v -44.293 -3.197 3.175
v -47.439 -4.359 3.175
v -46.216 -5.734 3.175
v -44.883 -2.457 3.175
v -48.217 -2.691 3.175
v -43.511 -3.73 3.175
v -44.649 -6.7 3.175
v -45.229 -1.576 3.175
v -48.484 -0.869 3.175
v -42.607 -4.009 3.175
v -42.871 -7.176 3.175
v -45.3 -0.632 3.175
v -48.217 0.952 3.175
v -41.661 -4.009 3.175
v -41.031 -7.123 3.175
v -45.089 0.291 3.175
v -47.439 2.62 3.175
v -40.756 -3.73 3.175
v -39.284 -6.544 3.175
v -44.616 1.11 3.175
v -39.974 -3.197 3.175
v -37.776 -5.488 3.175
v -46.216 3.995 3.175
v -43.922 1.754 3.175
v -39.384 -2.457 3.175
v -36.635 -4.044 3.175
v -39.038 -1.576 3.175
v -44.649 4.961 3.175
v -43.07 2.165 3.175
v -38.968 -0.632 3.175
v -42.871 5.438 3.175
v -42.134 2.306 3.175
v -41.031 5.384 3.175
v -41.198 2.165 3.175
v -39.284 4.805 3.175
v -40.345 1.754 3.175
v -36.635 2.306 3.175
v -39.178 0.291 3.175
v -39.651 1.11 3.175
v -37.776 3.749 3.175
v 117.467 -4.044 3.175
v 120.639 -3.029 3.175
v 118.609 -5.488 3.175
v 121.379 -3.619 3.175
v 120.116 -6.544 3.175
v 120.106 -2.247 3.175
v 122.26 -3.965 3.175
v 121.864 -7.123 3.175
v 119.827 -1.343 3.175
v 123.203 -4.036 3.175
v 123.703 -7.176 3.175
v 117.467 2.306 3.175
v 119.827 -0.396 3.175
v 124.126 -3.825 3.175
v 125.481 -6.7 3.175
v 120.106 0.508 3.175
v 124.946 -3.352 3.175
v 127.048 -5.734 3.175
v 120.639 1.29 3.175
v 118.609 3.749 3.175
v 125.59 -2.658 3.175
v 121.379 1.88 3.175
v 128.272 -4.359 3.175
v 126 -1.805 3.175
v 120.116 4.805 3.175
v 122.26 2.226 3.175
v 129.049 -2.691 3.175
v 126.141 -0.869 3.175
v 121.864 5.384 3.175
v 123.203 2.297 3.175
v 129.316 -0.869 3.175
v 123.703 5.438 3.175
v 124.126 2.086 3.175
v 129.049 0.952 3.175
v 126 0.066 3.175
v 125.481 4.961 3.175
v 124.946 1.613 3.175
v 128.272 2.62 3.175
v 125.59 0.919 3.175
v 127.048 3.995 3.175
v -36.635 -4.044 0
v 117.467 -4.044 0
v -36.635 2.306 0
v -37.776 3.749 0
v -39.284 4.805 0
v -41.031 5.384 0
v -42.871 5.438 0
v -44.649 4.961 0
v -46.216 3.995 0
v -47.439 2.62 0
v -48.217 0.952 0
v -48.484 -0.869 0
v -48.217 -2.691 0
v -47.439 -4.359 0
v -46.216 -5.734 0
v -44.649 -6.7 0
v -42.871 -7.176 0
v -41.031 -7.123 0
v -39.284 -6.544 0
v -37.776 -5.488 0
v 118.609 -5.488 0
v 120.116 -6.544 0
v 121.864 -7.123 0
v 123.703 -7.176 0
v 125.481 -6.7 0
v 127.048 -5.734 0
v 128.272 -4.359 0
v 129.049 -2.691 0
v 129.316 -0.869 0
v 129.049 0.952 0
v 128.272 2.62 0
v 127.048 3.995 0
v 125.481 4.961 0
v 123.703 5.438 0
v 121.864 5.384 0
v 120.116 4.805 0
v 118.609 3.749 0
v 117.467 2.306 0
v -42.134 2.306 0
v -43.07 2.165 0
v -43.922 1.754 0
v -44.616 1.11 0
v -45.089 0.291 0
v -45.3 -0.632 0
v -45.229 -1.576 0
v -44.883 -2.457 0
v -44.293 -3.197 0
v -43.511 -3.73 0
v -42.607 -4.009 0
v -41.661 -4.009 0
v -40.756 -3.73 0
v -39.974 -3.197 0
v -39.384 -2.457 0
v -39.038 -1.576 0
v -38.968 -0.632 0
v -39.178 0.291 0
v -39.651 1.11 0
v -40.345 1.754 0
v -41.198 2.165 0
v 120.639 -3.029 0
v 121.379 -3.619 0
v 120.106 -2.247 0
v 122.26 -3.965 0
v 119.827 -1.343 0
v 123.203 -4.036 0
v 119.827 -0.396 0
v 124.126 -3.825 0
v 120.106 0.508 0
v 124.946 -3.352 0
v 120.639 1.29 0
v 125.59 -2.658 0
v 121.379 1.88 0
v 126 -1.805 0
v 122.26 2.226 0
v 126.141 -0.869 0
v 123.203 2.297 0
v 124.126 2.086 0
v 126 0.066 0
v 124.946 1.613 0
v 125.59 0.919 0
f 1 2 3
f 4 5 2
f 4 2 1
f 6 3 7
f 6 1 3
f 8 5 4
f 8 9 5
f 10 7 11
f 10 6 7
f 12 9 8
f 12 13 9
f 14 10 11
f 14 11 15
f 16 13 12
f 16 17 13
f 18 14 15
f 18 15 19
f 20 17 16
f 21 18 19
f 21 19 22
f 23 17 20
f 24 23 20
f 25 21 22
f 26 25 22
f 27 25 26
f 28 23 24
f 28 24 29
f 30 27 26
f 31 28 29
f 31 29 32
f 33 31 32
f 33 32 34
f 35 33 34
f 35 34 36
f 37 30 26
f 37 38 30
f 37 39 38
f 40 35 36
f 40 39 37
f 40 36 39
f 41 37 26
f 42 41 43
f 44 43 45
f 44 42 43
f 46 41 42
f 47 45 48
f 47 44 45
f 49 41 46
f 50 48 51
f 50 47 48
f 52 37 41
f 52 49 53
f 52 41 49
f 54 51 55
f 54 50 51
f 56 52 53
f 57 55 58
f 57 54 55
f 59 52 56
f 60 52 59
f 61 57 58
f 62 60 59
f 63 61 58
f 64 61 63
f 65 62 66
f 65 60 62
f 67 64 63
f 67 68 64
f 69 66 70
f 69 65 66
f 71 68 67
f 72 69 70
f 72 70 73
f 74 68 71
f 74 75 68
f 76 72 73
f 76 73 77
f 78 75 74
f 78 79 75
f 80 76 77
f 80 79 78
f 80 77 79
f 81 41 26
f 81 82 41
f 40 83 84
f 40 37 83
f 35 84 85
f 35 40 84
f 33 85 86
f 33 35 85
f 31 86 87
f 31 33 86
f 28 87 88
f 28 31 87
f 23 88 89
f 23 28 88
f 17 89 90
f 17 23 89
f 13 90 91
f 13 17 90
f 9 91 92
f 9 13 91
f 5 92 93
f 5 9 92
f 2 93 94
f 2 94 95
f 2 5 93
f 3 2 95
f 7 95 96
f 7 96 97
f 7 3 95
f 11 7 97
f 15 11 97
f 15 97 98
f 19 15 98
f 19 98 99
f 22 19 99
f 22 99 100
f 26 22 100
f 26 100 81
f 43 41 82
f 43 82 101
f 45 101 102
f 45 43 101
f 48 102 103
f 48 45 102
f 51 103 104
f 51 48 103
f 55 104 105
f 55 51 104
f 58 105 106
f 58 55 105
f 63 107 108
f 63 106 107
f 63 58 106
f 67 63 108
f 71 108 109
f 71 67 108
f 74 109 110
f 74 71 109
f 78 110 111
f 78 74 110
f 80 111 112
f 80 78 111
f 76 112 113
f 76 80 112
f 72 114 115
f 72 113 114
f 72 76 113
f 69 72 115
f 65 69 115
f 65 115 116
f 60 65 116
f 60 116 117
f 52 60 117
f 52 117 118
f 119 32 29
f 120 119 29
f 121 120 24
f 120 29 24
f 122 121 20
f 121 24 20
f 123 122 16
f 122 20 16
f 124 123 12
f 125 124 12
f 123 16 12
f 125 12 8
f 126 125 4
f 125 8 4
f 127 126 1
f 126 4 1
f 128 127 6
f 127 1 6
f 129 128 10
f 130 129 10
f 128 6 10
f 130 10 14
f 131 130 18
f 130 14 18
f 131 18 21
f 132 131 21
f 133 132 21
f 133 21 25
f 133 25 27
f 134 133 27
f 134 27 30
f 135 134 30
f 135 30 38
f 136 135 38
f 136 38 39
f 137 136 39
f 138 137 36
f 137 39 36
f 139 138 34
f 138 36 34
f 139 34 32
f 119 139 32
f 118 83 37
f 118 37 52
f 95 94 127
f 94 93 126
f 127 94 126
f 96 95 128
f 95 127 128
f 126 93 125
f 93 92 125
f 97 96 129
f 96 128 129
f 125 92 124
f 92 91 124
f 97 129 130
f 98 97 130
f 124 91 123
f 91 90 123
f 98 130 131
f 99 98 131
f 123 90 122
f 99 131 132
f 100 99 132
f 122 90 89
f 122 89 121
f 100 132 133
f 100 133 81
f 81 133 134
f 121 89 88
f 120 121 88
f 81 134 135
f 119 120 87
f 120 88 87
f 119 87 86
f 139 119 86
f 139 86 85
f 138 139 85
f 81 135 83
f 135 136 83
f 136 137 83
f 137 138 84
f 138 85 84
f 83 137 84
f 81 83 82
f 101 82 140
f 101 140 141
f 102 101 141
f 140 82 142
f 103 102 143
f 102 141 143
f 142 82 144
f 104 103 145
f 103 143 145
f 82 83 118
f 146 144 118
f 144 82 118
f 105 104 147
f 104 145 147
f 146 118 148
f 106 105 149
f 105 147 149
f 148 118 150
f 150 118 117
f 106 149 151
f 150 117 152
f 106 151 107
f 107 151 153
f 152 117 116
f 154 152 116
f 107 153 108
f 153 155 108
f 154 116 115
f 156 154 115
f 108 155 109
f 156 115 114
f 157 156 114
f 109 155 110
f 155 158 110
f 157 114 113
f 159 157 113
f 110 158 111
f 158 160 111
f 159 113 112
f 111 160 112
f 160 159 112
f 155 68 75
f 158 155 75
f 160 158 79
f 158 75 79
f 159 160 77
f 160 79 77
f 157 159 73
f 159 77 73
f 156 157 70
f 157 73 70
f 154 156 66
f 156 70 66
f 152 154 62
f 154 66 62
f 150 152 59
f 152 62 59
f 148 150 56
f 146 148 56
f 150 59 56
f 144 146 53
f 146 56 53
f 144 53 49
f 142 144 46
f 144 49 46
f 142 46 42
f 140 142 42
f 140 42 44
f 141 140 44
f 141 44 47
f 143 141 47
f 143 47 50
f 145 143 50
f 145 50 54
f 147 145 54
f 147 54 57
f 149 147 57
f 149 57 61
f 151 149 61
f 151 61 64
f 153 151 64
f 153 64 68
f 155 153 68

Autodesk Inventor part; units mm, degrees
ref_plane "YZ Plane" through (0, 0, 0) normal (1, 0, 0) x (0, 1, 0)
ref_plane "XZ Plane" through (0, 0, 0) normal (0, 1, 0) x (-1, 0, 0)
ref_plane "XY Plane" through (0, 0, 0) normal (0, 0, 1) x (1, 0, 0)
sketch "Sketch1" plane through (0, 0, 0) normal (0, 0, 1) x (1, 0, 0)
  line L0 (-42.1338, 2.3056) -> (122.9662, 2.3056)
  line L1 (122.9662, 2.3056) -> (122.9662, -4.0444)
  line L2 (122.9662, -4.0444) -> (-42.1338, -4.0444)
  line L3 (-42.1338, -4.0444) -> (-42.1338, 2.3056)
  line L4 (-42.1338, 2.3056) -> (-42.1338, -0.8694)
  line L5 (-42.1338, -0.8694) -> (122.9662, -0.8694)
  circle A0 centre (-42.1338, -0.8694) radius 3.175
  circle A1 centre (122.9662, -0.8694) radius 3.175
  point P0 (0, 0)
  dimension "d0" = 165.1
  dimension "d1" = 6.35
extrude "Extrusion1" add sketch "Sketch1" along normal blind 3.175
sketch "Sketch2" plane through (0, 0, 3.175) normal (0, 0, 1) x (1, 0, 0)
  arc A0 (122.9662, -4.0444) -> (122.9662, 2.3056) centre (122.9662, -0.8694) ccw projected
  arc A1 (-42.1338, 2.3056) -> (-42.1338, -4.0444) centre (-42.1338, -0.8694) ccw projected
  circle A2 centre (-42.1338, -0.8694) radius 3.175
  circle A3 centre (122.9662, -0.8694) radius 6.35
  circle A4 centre (-42.1338, -0.8694) radius 6.35
  circle A5 centre (122.9662, -0.8694) radius 3.175
  point P0 (0, 0)
  dimension "d4" = 12.7
  dimension "d5" = 12.7
extrude "Extrusion2" cut sketch "Sketch2" against normal blind 3.175 contours A5 A0 | A2 A1
sketch "Sketch3" plane through (0, 0, 3.175) normal (0, 0, 1) x (1, 0, 0)
  arc A0 (122.9662, 2.3056) -> (122.9662, -4.0444) centre (122.9662, -0.8694) ccw projected
  arc A1 (-42.1338, -4.0444) -> (-42.1338, 2.3056) centre (-42.1338, -0.8694) ccw projected
  circle A2 centre (-42.1338, -0.8694) radius 3.175
  circle A3 centre (-42.1338, -0.8694) radius 6.35
  circle A4 centre (122.9662, -0.8694) radius 3.175
  circle A5 centre (122.9662, -0.8694) radius 6.35
  point P0 (0, 0)
  dimension "d8" = 12.7
  dimension "d9" = 12.7
extrude "Extrusion3" add sketch "Sketch3" against normal blind 3.175
properties part number "bar2"
